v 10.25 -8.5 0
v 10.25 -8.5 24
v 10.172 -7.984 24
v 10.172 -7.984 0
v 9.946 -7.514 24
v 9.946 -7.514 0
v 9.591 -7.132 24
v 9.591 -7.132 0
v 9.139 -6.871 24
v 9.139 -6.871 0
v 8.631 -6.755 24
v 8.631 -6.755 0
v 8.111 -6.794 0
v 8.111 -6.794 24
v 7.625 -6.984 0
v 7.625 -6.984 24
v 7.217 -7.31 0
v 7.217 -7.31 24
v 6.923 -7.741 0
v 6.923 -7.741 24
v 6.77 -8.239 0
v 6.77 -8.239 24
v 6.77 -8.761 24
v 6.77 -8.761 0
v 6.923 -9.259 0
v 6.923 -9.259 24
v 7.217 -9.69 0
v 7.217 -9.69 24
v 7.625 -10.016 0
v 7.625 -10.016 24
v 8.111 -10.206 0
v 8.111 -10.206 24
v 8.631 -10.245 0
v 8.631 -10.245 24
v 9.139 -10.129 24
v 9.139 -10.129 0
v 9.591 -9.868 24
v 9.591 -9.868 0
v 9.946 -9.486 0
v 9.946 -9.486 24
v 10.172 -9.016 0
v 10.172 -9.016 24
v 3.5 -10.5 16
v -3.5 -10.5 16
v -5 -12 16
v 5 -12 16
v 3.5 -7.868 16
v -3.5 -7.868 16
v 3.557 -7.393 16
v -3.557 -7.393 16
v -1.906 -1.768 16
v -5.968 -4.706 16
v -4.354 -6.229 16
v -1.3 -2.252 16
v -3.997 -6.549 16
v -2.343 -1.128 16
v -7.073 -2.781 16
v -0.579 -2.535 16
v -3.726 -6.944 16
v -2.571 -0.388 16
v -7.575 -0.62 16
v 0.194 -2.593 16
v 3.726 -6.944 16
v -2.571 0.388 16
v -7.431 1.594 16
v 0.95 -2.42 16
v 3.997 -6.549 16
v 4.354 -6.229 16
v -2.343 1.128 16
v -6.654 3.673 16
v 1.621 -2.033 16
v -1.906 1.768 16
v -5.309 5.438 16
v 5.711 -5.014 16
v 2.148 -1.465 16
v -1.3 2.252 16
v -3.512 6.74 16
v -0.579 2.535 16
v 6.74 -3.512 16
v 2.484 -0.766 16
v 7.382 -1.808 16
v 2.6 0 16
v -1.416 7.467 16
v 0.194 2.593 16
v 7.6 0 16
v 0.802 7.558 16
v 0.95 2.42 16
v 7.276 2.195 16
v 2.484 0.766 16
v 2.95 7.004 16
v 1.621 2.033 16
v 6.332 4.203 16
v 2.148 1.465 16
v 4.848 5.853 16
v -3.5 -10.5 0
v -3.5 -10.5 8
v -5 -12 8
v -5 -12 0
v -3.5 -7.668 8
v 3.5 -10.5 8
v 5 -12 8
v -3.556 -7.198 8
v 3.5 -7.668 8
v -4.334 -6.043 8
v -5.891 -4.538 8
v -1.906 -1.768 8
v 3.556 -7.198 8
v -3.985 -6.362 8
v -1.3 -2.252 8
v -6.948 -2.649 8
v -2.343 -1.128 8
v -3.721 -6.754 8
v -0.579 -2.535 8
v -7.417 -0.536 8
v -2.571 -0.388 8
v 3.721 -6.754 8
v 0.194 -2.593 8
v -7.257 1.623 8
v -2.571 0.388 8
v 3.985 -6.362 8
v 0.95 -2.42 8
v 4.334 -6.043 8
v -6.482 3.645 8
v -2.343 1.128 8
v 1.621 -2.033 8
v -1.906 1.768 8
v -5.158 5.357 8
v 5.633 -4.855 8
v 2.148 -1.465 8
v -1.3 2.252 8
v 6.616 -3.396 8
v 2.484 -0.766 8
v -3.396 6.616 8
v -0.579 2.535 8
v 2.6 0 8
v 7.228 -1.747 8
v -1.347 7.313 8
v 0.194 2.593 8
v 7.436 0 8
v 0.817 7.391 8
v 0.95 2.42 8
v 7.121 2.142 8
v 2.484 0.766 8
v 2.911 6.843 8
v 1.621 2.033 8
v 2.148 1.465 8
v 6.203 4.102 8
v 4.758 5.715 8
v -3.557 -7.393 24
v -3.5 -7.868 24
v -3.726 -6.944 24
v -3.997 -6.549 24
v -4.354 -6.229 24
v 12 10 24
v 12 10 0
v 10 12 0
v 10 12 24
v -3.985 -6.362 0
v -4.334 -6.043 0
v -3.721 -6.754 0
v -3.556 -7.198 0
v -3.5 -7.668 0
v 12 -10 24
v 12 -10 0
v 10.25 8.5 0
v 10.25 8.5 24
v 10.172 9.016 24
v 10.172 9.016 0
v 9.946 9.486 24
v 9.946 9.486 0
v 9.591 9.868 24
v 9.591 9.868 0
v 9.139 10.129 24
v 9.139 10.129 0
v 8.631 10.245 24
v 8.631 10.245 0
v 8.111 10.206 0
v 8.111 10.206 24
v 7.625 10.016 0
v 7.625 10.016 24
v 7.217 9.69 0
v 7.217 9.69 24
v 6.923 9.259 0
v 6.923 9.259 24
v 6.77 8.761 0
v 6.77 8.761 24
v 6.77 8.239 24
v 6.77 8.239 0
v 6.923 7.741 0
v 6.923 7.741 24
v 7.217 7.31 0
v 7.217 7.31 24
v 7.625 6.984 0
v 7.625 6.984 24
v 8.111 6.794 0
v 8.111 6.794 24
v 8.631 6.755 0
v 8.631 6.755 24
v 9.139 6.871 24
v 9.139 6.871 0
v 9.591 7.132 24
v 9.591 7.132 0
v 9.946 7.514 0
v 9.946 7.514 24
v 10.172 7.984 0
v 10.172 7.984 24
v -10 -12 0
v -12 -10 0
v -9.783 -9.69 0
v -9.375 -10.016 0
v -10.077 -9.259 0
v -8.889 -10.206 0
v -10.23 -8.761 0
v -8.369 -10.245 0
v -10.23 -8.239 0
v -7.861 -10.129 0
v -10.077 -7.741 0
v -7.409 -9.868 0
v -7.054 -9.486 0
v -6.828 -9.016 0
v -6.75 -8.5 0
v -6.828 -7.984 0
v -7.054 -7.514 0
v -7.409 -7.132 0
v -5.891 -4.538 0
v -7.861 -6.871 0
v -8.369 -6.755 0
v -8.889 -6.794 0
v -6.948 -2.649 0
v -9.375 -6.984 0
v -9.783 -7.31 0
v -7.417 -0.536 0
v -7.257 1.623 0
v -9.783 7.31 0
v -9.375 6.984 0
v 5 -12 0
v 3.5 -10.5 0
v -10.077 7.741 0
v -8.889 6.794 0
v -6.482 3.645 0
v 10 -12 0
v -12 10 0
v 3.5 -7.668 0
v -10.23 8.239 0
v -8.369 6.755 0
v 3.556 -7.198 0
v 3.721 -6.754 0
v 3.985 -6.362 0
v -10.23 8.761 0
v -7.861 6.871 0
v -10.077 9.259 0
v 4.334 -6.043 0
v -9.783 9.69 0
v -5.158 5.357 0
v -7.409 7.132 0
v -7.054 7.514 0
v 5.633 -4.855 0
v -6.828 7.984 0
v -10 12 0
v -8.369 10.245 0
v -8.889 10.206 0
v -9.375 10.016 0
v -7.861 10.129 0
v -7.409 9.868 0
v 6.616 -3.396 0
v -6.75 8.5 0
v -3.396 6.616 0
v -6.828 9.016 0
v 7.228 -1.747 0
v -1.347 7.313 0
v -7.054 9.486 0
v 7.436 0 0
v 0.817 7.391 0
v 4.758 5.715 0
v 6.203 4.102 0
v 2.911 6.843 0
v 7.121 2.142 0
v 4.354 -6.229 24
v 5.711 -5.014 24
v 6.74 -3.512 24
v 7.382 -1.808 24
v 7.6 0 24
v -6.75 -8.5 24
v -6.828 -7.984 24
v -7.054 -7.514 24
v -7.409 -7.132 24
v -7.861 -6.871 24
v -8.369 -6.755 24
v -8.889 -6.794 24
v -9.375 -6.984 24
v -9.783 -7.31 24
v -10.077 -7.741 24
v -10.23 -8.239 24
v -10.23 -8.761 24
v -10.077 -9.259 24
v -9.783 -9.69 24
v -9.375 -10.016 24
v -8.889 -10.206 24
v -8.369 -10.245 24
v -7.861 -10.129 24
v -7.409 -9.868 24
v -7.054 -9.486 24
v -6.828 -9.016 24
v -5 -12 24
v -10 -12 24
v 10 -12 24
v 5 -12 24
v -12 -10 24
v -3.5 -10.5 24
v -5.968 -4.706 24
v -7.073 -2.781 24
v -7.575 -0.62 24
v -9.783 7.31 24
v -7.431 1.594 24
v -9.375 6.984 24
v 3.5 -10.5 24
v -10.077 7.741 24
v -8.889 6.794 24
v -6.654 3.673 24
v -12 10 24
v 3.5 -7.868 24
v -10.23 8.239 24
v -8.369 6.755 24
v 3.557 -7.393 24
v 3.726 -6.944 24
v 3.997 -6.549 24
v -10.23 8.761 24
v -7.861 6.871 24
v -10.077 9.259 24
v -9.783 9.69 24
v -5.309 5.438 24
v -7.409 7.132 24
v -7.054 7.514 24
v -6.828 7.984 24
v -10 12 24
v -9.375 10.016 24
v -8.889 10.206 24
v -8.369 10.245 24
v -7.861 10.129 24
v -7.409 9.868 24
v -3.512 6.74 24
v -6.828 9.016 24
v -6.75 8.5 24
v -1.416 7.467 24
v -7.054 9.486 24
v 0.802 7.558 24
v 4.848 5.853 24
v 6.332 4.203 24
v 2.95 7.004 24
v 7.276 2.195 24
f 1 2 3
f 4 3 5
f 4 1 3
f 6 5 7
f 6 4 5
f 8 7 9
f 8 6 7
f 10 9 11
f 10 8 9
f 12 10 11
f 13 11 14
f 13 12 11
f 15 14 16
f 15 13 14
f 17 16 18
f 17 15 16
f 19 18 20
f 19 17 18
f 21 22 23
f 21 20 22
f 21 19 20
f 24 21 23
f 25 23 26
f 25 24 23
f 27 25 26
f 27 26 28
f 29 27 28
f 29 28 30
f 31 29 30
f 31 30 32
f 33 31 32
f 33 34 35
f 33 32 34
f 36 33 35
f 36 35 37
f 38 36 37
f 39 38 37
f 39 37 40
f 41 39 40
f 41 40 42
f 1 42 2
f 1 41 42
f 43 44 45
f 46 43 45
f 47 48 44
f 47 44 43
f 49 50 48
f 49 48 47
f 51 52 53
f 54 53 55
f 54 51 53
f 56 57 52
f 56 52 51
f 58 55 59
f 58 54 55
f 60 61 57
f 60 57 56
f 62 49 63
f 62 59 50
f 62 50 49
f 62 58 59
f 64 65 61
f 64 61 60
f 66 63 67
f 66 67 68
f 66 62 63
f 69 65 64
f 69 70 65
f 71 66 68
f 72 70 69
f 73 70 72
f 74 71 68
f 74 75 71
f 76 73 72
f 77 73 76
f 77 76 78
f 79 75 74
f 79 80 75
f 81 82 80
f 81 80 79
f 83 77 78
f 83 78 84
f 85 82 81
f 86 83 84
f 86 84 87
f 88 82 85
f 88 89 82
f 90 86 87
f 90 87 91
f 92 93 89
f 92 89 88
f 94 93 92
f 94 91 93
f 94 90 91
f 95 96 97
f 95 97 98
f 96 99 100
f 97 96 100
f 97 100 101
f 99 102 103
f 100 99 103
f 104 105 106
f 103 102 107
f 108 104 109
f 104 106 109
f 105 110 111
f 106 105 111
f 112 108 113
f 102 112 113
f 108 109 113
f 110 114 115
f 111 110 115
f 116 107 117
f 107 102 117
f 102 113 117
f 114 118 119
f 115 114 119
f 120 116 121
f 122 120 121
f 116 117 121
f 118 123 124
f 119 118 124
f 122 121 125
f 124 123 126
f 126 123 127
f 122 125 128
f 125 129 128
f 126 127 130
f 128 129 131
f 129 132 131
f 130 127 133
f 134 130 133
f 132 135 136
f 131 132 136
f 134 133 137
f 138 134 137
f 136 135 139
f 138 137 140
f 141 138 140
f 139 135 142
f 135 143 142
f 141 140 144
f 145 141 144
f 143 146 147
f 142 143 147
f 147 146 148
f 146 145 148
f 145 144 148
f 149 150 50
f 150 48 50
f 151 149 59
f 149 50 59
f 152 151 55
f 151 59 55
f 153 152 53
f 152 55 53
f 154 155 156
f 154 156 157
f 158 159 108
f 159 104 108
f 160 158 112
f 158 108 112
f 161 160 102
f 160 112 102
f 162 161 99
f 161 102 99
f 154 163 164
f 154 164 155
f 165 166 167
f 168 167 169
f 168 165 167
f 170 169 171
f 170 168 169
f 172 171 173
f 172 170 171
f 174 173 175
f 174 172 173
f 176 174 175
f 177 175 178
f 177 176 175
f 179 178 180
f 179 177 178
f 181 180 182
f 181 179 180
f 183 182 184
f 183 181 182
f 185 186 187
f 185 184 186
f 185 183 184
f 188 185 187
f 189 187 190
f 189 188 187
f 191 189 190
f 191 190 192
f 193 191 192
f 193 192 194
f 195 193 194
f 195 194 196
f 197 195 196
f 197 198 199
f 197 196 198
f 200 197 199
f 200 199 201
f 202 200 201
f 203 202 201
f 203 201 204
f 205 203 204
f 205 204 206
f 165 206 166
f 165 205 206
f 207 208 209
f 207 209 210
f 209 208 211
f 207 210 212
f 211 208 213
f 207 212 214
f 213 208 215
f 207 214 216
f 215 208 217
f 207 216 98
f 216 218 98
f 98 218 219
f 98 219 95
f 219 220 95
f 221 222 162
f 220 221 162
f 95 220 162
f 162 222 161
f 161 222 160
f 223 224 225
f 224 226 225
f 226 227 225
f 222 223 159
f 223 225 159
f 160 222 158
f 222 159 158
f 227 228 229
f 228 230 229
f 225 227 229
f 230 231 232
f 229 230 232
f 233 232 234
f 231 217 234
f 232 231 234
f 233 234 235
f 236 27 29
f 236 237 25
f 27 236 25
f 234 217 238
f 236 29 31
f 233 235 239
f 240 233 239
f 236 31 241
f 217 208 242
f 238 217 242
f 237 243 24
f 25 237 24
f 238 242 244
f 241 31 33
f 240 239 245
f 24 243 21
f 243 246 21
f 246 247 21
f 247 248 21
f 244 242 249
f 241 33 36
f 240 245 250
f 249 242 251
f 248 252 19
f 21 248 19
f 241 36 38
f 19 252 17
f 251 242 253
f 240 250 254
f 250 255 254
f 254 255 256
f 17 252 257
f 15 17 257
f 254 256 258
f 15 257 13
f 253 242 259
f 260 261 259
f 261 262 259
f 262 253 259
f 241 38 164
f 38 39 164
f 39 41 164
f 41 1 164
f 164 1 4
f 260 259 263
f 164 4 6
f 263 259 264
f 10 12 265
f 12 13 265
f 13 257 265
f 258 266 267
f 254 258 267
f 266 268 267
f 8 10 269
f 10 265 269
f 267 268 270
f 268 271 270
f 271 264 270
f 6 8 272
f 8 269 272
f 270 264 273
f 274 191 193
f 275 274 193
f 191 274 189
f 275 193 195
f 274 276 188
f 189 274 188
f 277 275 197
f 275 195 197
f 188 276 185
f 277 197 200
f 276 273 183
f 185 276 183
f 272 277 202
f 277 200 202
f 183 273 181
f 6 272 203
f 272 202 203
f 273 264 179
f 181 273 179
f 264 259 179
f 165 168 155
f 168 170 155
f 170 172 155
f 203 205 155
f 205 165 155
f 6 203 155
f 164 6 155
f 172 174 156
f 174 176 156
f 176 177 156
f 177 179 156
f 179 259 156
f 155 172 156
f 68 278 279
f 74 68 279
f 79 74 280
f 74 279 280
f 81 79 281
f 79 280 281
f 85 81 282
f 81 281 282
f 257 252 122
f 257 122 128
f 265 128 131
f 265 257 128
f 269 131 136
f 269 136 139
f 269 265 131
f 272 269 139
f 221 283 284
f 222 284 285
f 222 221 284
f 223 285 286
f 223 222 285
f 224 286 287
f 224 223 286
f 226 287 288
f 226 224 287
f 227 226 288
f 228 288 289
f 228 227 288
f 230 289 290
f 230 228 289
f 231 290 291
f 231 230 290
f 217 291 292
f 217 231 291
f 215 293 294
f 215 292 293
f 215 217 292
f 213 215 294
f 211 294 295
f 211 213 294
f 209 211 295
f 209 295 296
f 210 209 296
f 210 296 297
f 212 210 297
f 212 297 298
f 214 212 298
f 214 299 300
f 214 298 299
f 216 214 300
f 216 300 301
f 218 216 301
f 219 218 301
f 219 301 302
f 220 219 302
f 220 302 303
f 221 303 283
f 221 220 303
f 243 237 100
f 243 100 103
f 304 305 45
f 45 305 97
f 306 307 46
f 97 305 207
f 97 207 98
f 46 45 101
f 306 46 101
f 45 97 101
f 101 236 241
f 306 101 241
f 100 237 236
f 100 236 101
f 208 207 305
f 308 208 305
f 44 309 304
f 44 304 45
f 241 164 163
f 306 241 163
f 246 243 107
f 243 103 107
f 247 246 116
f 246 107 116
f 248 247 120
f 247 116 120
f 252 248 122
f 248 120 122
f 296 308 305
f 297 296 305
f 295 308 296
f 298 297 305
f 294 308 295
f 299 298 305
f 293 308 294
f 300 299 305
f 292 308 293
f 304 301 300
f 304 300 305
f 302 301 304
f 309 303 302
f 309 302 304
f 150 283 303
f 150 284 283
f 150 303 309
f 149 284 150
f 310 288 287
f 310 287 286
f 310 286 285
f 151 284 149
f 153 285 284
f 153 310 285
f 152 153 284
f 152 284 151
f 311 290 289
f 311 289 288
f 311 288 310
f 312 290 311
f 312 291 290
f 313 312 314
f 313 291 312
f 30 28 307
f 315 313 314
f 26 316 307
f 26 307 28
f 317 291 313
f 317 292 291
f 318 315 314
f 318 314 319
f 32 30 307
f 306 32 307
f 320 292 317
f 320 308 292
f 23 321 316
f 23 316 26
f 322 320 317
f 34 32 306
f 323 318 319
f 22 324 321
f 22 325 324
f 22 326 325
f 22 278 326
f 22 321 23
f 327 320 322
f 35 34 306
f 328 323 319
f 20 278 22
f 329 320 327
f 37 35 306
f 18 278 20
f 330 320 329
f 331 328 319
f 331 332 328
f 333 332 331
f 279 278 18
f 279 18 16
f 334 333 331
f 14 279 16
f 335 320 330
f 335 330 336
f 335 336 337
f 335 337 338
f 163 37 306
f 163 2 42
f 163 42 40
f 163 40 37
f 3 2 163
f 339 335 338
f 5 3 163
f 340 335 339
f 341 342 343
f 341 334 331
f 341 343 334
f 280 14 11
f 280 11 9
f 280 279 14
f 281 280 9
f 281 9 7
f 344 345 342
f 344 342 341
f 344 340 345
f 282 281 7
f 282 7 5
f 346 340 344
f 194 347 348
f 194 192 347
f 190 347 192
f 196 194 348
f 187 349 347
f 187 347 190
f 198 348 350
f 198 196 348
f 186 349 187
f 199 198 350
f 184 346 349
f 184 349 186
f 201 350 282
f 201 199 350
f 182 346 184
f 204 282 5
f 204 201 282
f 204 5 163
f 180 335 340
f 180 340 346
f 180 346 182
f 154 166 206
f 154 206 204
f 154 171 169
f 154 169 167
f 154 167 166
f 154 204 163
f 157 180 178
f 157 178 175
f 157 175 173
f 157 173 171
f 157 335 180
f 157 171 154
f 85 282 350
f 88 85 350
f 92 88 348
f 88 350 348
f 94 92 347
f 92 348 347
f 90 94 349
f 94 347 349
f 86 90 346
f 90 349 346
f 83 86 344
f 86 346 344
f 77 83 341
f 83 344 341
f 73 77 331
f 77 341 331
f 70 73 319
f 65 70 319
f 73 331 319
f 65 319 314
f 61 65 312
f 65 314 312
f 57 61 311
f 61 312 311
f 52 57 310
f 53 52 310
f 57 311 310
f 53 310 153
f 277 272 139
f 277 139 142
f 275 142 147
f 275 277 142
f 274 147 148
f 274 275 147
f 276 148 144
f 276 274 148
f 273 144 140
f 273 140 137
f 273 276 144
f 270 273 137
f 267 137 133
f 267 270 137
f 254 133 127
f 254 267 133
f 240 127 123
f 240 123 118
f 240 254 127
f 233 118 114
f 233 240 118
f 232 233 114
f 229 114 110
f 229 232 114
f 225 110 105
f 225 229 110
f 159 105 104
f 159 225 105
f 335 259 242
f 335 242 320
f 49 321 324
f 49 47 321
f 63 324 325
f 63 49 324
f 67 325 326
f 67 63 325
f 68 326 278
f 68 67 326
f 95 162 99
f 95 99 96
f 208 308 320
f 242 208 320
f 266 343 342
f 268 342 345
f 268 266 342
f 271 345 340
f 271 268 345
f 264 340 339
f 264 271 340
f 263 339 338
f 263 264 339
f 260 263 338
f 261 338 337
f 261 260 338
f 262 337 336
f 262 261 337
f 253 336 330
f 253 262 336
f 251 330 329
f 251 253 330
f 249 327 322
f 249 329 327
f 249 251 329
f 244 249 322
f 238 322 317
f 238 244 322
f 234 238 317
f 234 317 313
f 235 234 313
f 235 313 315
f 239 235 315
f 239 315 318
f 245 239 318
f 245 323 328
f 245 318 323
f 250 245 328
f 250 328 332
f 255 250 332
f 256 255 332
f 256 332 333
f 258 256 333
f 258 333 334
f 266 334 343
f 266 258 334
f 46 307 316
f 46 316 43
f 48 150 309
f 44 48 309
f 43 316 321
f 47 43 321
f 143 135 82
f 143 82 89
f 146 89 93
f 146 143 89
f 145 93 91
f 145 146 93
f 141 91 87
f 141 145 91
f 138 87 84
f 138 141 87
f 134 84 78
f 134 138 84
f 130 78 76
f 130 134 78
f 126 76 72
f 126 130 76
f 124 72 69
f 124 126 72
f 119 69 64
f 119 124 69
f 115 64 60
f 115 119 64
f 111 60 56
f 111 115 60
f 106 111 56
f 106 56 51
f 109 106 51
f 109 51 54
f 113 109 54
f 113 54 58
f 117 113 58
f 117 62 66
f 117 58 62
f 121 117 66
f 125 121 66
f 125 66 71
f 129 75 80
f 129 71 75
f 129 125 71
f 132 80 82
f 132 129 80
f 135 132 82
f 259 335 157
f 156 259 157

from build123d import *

# Parameters (mm, degrees)
F0_W      = 24
F0_H      = 24
F0_R      = 2.6
F1_DEPTH  = 24
F2_SIZE   = 2
F4_DEPTH  = 8
F5_R      = 2
F7_DEPTH  = 8
F8_R      = 2
F9_SIZE   = 1.5
F10_R     = 1.75
F11_DEPTH = 25


with BuildPart() as f1:
    # F0 (on Top) → F1 (new body)
    with BuildSketch(Plane.XY):
        Rectangle(F0_W, F0_H)
        Circle(F0_R, mode=Mode.SUBTRACT)
    extrude(amount=F1_DEPTH)

    # F2
    f2_edges = [f1.edges().sort_by_distance(p)[0] for p in [
        (-12, -12, 12),
        (12, -12, 12),
        (-12, 12, 12),
        (12, 12, 12),
    ]]
    chamfer(f2_edges, length=F2_SIZE)

    # F3 (on Top) → F4 (cut)
    with BuildSketch(Plane.XY):
        with BuildLine():
            ThreePointArc((3.5, -6.5611658181), (6.3767557079, -3.8256873283), (7.4363228072, 0))
            ThreePointArc((7.4363228072, 0), (-3.8256873283, 6.3767557079), (-3.5, -6.5611658181))
            Line((-3.5, -6.5611658181), (-3.5, -3))
            Line((-3.5, -3), (3.5, -3))
            Line((3.5, -3), (3.5, -6.5611658181))
        make_face()
        with BuildLine():
            Line((-3.5, -3), (-3.5, -6.5611658181))
            ThreePointArc((-3.5, -6.5611658181), (0, -7.4363228072), (3.5, -6.5611658181))
            Line((3.5, -6.5611658181), (3.5, -3))
            Line((3.5, -3), (-3.5, -3))
        make_face()
        with BuildLine():
            ThreePointArc((3.5, -6.5611658181), (0, -7.4363228072), (-3.5, -6.5611658181))
            Line((-3.5, -6.5611658181), (-3.5, -13))
            Line((-3.5, -13), (3.5, -13))
            Line((3.5, -13), (3.5, -6.5611658181))
        make_face()
    extrude(amount=F4_DEPTH, mode=Mode.SUBTRACT)

    # F5
    f5_edges = [f1.edges().sort_by_distance(p)[0] for p in [
        (-3.5, -6.561166, 4),
        (3.5, -6.561166, 4),
    ]]
    fillet(f5_edges, radius=F5_R)

    # F6 (on face) → F7 (cut)
    with BuildSketch(Plane.XY.offset(24)):
        with BuildLine():
            ThreePointArc((3.5, -6.7461099902), (6.4946131525, -3.9471508712), (7.6, 0))
            ThreePointArc((7.6, 0), (-3.9471508712, 6.4946131525), (-3.5, -6.7461099902))
            Line((-3.5, -6.7461099902), (-3.5, -4.0145893581))
            Line((-3.5, -4.0145893581), (3.5, -4.0145893581))
            Line((3.5, -4.0145893581), (3.5, -6.7461099902))
        make_face()
        with BuildLine():
            Line((-3.5, -4.0145893581), (-3.5, -6.7461099902))
            ThreePointArc((-3.5, -6.7461099902), (0, -7.6), (3.5, -6.7461099902))
            Line((3.5, -6.7461099902), (3.5, -4.0145893581))
            Line((3.5, -4.0145893581), (-3.5, -4.0145893581))
        make_face()
        with BuildLine():
            ThreePointArc((3.5, -6.7461099902), (0, -7.6), (-3.5, -6.7461099902))
            Line((-3.5, -6.7461099902), (-3.5, -12))
            Line((-3.5, -12), (3.5, -12))
            Line((3.5, -12), (3.5, -6.7461099902))
        make_face()
    extrude(amount=-F7_DEPTH, mode=Mode.SUBTRACT)

    # F8
    f8_edges = [f1.edges().sort_by_distance(p)[0] for p in [
        (3.5, -6.74611, 20),
        (-3.5, -6.74611, 20),
    ]]
    fillet(f8_edges, radius=F8_R)

    # F9
    f9_edges = [f1.edges().sort_by_distance(p)[0] for p in [
        (3.5, -12, 20),
        (-3.5, -12, 20),
        (3.5, -12, 4),
        (-3.5, -12, 4),
    ]]
    chamfer(f9_edges, length=F9_SIZE)

    # F10 (on Top) → F11 (cut)
    with BuildSketch(Plane.XY):
        with Locations((-8.5, -8.5)):
            Circle(F10_R)
        with Locations((8.5, -8.5)):
            Circle(F10_R)
        with Locations((8.5, 8.5)):
            Circle(F10_R)
        with Locations((-8.5, 8.5)):
            Circle(F10_R)
    extrude(amount=F11_DEPTH, mode=Mode.SUBTRACT)


solid = f1.part
